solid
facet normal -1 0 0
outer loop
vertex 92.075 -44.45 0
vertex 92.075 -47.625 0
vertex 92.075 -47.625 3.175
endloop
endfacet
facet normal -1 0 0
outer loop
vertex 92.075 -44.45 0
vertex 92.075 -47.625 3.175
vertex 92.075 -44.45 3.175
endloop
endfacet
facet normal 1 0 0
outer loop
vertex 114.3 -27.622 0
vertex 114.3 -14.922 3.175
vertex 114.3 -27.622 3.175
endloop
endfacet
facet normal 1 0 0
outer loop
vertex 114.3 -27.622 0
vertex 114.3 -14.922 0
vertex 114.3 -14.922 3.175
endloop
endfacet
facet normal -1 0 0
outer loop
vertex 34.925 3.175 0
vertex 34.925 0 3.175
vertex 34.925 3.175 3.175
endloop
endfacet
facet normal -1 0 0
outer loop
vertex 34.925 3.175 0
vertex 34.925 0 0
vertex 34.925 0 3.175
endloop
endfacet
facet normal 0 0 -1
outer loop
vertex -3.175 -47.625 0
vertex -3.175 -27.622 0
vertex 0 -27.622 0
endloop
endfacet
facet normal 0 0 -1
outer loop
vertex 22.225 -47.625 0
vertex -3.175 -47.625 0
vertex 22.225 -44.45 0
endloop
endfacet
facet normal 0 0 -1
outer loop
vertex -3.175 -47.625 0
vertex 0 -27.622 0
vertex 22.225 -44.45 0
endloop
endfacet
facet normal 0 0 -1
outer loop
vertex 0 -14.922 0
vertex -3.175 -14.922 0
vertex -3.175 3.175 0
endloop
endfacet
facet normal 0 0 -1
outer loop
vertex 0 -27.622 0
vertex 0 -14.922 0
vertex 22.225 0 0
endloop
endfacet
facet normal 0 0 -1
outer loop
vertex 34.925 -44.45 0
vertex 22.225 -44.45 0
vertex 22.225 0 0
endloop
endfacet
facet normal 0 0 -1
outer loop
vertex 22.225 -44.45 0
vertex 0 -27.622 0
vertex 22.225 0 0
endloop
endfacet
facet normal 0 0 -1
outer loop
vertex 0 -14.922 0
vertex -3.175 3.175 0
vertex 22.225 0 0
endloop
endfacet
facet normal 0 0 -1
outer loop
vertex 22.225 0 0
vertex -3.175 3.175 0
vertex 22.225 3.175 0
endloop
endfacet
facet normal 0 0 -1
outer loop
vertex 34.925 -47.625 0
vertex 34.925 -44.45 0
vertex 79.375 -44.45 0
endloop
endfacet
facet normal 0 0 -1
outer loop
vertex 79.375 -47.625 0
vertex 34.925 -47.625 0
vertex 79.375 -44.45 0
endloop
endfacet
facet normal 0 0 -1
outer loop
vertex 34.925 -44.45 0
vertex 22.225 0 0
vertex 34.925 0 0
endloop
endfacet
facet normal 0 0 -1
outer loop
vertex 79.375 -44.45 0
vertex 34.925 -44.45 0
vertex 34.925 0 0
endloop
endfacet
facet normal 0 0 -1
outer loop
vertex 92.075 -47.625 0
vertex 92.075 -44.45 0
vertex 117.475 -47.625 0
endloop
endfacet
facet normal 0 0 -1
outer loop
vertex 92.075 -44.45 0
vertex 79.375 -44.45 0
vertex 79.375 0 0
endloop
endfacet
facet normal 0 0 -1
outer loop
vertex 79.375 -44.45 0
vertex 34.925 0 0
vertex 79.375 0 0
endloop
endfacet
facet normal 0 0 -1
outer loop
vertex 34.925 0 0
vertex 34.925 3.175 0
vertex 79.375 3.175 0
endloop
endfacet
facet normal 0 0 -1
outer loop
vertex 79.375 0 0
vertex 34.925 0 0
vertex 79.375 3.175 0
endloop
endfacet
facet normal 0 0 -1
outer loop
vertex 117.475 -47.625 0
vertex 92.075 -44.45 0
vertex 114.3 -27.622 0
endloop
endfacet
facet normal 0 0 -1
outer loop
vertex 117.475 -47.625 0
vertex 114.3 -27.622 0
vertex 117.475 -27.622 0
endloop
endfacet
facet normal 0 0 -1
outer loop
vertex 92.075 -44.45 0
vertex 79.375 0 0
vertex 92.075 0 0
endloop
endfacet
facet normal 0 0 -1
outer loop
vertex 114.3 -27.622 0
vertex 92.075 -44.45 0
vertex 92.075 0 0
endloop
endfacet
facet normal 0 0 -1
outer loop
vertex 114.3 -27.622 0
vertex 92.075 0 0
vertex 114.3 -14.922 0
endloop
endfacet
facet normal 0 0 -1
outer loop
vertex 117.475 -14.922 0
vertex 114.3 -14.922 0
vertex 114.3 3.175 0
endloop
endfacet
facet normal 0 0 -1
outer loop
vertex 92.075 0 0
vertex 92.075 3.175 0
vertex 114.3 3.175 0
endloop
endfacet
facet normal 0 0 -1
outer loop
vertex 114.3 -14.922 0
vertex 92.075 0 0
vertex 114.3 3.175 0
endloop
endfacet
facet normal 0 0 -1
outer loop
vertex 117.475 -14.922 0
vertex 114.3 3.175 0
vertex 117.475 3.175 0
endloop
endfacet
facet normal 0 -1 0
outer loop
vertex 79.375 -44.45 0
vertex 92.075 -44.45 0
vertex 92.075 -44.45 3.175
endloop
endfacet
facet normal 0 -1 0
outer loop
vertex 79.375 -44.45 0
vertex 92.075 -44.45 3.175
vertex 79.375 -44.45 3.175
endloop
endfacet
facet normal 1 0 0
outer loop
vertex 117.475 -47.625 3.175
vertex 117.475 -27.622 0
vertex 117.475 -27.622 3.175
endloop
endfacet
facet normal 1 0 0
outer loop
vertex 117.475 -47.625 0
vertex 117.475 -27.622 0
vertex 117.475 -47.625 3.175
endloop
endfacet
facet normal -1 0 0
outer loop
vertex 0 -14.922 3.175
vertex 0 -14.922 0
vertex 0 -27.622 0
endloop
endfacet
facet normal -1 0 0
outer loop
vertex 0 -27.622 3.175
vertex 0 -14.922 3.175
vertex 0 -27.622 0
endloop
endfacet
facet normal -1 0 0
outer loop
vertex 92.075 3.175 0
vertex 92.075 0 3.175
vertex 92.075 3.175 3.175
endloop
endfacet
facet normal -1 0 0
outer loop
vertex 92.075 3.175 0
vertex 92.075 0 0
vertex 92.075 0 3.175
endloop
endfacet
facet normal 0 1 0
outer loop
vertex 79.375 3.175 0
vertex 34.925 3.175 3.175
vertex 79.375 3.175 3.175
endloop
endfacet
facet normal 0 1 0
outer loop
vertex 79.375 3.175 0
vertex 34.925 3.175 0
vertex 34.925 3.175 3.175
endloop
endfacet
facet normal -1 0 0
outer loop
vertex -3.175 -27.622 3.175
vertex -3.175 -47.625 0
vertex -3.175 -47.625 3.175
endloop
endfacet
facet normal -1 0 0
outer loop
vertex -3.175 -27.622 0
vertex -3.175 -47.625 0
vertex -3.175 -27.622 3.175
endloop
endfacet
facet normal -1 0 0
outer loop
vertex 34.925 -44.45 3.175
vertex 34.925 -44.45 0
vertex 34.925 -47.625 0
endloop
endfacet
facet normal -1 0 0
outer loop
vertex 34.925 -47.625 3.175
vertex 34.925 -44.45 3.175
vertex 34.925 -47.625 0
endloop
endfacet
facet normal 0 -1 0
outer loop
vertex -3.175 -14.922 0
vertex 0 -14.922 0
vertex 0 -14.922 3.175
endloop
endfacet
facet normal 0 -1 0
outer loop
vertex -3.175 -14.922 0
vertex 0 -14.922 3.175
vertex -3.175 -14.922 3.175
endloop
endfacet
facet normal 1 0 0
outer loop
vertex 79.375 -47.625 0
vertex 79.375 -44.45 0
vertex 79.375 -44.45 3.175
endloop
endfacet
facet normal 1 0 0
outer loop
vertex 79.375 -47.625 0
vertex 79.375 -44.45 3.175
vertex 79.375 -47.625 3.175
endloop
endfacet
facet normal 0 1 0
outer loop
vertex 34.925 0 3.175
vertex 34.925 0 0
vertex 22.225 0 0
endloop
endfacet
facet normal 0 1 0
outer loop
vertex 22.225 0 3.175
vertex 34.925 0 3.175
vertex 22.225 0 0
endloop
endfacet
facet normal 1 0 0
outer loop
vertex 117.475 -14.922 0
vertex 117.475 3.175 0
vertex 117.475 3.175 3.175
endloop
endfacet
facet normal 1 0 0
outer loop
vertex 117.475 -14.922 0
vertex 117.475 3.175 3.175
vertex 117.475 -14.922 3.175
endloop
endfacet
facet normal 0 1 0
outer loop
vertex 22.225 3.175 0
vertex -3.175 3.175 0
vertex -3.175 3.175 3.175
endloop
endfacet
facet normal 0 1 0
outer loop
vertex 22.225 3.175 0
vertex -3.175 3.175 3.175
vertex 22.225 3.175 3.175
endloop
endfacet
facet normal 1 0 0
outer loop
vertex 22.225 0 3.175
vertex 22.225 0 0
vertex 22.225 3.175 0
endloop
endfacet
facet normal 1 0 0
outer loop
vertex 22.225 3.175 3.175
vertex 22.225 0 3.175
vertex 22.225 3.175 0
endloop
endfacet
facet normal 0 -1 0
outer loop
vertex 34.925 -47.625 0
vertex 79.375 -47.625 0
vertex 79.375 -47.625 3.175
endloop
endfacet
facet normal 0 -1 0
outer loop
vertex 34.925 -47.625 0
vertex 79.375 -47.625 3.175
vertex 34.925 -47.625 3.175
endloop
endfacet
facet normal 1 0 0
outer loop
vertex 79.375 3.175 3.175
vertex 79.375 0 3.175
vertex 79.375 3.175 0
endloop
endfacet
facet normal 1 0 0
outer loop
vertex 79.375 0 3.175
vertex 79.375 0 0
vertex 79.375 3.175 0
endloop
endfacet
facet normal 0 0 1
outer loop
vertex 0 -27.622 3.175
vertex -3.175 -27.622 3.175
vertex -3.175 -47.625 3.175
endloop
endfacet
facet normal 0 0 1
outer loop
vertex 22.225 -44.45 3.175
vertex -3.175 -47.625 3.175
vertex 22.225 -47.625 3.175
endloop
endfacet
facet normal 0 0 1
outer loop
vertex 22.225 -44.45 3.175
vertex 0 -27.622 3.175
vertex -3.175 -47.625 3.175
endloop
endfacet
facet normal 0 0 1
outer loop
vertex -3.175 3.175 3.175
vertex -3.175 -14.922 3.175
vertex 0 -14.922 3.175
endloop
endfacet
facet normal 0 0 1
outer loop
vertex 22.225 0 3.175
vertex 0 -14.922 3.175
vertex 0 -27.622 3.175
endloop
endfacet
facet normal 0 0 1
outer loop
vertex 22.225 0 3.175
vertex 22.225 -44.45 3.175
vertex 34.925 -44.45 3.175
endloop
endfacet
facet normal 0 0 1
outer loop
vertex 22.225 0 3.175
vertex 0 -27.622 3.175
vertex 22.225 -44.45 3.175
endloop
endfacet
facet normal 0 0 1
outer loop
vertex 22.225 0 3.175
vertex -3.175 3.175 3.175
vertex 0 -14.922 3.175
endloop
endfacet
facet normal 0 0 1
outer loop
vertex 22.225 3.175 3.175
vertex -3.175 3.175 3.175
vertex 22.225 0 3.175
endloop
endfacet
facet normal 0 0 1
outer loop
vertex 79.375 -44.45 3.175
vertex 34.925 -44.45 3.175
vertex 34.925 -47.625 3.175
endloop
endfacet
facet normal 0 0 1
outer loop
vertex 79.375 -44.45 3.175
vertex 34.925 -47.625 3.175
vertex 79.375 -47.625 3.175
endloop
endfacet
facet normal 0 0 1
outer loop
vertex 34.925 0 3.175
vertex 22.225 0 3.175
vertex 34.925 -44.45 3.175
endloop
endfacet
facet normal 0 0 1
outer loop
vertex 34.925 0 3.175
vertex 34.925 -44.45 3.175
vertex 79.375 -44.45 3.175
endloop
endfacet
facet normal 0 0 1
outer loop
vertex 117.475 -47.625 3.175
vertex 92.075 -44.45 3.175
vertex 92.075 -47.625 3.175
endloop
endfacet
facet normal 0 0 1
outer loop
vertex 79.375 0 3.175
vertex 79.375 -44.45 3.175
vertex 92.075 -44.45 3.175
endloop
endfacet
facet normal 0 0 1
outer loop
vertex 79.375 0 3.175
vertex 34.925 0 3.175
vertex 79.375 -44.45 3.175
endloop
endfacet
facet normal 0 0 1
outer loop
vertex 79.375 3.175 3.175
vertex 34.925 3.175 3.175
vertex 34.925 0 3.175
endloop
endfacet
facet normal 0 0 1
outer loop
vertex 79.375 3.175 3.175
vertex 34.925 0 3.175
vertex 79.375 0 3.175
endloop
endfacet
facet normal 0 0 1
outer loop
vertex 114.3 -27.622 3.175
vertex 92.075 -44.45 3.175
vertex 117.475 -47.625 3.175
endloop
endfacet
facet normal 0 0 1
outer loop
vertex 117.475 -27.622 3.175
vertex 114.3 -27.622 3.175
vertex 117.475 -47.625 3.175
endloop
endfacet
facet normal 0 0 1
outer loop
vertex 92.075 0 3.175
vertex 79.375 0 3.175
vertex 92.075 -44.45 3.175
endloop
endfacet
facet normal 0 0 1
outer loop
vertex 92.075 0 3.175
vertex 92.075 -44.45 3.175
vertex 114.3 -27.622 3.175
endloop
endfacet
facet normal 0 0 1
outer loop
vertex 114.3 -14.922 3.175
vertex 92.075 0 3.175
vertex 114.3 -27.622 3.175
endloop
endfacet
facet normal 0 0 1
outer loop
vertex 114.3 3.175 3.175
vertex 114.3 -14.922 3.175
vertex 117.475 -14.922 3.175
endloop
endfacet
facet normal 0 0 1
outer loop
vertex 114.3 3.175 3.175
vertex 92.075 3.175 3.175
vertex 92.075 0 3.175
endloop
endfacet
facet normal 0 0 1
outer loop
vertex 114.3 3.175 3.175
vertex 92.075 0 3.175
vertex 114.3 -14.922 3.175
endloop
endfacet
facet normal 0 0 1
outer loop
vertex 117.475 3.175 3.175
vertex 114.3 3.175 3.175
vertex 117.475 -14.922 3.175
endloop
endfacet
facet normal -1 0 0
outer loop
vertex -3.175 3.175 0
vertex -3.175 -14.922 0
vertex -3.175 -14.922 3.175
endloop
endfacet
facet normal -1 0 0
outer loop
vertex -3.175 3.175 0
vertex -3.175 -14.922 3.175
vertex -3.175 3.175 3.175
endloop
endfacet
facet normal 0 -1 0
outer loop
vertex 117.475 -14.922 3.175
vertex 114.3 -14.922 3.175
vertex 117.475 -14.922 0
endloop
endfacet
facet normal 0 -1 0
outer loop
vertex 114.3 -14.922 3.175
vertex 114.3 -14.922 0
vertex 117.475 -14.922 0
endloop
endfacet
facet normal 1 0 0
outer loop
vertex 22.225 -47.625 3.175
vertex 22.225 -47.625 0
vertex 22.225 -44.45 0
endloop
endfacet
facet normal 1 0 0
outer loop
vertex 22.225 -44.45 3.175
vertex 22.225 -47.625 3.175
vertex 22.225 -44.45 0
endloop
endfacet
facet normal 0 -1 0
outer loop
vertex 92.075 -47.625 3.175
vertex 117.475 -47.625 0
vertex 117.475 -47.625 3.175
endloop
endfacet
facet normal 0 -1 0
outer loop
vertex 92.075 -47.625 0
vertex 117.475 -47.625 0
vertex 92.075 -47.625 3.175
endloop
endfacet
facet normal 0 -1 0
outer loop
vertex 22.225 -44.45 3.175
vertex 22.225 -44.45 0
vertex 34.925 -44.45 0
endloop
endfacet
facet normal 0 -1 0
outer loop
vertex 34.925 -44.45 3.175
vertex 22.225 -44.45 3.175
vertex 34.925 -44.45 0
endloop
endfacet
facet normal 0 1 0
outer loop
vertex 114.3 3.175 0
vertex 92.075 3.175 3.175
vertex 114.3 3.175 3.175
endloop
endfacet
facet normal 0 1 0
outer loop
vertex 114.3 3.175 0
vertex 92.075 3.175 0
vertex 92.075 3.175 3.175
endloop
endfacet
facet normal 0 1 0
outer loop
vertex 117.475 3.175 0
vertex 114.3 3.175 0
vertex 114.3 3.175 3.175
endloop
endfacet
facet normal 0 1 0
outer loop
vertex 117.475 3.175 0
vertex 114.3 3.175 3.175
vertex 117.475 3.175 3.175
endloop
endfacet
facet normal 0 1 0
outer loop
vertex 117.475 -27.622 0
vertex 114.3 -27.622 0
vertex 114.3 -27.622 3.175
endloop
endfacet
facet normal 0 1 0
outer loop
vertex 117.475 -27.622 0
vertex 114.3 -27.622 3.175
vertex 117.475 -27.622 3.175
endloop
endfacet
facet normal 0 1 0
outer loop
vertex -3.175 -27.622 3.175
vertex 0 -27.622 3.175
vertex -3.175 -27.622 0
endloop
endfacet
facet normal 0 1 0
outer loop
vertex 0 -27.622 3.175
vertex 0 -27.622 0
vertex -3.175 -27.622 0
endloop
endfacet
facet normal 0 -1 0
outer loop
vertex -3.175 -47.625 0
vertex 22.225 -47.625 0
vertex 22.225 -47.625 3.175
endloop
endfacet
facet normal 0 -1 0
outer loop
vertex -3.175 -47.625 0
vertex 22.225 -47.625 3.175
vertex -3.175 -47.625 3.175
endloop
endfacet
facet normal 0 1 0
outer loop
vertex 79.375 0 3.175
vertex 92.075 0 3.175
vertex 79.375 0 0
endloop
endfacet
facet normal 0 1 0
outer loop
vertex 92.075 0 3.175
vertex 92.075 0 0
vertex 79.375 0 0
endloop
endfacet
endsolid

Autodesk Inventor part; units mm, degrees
ref_plane "YZ Plane" through (0, 0, 0) normal (1, 0, 0) x (0, 1, 0)
ref_plane "XZ Plane" through (0, 0, 0) normal (0, 1, 0) x (-1, 0, 0)
ref_plane "XY Plane" through (0, 0, 0) normal (0, 0, 1) x (1, 0, 0)
sketch "Sketch1" plane through (0, 0, 0) normal (0, 0, 1) x (1, 0, 0)
  line L0 (117.475, 3.175) -> (117.475, -14.9225) projected
  line L1 (114.3, 3.175) -> (117.475, 3.175) projected
  line L2 (0, -14.9225) -> (-3.175, -14.9225) projected
  line L3 (0, -27.6225) -> (-3.175, -27.6225) projected
  line L4 (0, -14.9225) -> (0, -27.6225)
  line L5 (-3.175, -47.625) -> (-3.175, -27.6225)
  line L6 (-3.175, -14.9225) -> (-3.175, 3.175)
  line L7 (22.225, 0) -> (22.225, 3.175) projected
  line L8 (34.925, 0) -> (34.925, 3.175) projected
  line L9 (34.925, 0) -> (22.225, 0)
  line L10 (-3.175, 3.175) -> (22.225, 3.175)
  line L11 (79.375, 0) -> (79.375, 3.175) projected
  line L12 (92.075, 0) -> (92.075, 3.175) projected
  line L13 (92.075, 0) -> (79.375, 0)
  line L14 (34.925, 3.175) -> (79.375, 3.175)
  line L15 (92.075, 3.175) -> (117.475, 3.175)
  line L16 (114.3, -14.9225) -> (117.475, -14.9225) projected
  line L17 (114.3, -27.6225) -> (117.475, -27.6225) projected
  line L18 (114.3, -14.9225) -> (114.3, -27.6225)
  line L19 (117.475, 3.175) -> (117.475, -14.9225)
  line L20 (117.475, -27.6225) -> (117.475, -47.625)
  line L21 (92.075, -47.625) -> (92.075, -44.45)
  line L22 (92.075, -44.45) -> (79.375, -44.45)
  line L23 (79.375, -44.45) -> (79.375, -47.625)
  line L24 (22.225, -47.625) -> (22.225, -44.45)
  line L25 (22.225, -44.45) -> (34.925, -44.45)
  line L26 (34.925, -44.45) -> (34.925, -47.625)
  line L27 (22.225, -47.625) -> (-3.175, -47.625)
  line L28 (117.475, -47.625) -> (92.075, -47.625)
  line L29 (79.375, -47.625) -> (34.925, -47.625)
  point P0 (0, 0)
  dimension "d0" = 3.175
extrude "Extrusion1" add sketch "Sketch1" along normal blind 3.175
properties part number "top" material "ABS Plastic"
